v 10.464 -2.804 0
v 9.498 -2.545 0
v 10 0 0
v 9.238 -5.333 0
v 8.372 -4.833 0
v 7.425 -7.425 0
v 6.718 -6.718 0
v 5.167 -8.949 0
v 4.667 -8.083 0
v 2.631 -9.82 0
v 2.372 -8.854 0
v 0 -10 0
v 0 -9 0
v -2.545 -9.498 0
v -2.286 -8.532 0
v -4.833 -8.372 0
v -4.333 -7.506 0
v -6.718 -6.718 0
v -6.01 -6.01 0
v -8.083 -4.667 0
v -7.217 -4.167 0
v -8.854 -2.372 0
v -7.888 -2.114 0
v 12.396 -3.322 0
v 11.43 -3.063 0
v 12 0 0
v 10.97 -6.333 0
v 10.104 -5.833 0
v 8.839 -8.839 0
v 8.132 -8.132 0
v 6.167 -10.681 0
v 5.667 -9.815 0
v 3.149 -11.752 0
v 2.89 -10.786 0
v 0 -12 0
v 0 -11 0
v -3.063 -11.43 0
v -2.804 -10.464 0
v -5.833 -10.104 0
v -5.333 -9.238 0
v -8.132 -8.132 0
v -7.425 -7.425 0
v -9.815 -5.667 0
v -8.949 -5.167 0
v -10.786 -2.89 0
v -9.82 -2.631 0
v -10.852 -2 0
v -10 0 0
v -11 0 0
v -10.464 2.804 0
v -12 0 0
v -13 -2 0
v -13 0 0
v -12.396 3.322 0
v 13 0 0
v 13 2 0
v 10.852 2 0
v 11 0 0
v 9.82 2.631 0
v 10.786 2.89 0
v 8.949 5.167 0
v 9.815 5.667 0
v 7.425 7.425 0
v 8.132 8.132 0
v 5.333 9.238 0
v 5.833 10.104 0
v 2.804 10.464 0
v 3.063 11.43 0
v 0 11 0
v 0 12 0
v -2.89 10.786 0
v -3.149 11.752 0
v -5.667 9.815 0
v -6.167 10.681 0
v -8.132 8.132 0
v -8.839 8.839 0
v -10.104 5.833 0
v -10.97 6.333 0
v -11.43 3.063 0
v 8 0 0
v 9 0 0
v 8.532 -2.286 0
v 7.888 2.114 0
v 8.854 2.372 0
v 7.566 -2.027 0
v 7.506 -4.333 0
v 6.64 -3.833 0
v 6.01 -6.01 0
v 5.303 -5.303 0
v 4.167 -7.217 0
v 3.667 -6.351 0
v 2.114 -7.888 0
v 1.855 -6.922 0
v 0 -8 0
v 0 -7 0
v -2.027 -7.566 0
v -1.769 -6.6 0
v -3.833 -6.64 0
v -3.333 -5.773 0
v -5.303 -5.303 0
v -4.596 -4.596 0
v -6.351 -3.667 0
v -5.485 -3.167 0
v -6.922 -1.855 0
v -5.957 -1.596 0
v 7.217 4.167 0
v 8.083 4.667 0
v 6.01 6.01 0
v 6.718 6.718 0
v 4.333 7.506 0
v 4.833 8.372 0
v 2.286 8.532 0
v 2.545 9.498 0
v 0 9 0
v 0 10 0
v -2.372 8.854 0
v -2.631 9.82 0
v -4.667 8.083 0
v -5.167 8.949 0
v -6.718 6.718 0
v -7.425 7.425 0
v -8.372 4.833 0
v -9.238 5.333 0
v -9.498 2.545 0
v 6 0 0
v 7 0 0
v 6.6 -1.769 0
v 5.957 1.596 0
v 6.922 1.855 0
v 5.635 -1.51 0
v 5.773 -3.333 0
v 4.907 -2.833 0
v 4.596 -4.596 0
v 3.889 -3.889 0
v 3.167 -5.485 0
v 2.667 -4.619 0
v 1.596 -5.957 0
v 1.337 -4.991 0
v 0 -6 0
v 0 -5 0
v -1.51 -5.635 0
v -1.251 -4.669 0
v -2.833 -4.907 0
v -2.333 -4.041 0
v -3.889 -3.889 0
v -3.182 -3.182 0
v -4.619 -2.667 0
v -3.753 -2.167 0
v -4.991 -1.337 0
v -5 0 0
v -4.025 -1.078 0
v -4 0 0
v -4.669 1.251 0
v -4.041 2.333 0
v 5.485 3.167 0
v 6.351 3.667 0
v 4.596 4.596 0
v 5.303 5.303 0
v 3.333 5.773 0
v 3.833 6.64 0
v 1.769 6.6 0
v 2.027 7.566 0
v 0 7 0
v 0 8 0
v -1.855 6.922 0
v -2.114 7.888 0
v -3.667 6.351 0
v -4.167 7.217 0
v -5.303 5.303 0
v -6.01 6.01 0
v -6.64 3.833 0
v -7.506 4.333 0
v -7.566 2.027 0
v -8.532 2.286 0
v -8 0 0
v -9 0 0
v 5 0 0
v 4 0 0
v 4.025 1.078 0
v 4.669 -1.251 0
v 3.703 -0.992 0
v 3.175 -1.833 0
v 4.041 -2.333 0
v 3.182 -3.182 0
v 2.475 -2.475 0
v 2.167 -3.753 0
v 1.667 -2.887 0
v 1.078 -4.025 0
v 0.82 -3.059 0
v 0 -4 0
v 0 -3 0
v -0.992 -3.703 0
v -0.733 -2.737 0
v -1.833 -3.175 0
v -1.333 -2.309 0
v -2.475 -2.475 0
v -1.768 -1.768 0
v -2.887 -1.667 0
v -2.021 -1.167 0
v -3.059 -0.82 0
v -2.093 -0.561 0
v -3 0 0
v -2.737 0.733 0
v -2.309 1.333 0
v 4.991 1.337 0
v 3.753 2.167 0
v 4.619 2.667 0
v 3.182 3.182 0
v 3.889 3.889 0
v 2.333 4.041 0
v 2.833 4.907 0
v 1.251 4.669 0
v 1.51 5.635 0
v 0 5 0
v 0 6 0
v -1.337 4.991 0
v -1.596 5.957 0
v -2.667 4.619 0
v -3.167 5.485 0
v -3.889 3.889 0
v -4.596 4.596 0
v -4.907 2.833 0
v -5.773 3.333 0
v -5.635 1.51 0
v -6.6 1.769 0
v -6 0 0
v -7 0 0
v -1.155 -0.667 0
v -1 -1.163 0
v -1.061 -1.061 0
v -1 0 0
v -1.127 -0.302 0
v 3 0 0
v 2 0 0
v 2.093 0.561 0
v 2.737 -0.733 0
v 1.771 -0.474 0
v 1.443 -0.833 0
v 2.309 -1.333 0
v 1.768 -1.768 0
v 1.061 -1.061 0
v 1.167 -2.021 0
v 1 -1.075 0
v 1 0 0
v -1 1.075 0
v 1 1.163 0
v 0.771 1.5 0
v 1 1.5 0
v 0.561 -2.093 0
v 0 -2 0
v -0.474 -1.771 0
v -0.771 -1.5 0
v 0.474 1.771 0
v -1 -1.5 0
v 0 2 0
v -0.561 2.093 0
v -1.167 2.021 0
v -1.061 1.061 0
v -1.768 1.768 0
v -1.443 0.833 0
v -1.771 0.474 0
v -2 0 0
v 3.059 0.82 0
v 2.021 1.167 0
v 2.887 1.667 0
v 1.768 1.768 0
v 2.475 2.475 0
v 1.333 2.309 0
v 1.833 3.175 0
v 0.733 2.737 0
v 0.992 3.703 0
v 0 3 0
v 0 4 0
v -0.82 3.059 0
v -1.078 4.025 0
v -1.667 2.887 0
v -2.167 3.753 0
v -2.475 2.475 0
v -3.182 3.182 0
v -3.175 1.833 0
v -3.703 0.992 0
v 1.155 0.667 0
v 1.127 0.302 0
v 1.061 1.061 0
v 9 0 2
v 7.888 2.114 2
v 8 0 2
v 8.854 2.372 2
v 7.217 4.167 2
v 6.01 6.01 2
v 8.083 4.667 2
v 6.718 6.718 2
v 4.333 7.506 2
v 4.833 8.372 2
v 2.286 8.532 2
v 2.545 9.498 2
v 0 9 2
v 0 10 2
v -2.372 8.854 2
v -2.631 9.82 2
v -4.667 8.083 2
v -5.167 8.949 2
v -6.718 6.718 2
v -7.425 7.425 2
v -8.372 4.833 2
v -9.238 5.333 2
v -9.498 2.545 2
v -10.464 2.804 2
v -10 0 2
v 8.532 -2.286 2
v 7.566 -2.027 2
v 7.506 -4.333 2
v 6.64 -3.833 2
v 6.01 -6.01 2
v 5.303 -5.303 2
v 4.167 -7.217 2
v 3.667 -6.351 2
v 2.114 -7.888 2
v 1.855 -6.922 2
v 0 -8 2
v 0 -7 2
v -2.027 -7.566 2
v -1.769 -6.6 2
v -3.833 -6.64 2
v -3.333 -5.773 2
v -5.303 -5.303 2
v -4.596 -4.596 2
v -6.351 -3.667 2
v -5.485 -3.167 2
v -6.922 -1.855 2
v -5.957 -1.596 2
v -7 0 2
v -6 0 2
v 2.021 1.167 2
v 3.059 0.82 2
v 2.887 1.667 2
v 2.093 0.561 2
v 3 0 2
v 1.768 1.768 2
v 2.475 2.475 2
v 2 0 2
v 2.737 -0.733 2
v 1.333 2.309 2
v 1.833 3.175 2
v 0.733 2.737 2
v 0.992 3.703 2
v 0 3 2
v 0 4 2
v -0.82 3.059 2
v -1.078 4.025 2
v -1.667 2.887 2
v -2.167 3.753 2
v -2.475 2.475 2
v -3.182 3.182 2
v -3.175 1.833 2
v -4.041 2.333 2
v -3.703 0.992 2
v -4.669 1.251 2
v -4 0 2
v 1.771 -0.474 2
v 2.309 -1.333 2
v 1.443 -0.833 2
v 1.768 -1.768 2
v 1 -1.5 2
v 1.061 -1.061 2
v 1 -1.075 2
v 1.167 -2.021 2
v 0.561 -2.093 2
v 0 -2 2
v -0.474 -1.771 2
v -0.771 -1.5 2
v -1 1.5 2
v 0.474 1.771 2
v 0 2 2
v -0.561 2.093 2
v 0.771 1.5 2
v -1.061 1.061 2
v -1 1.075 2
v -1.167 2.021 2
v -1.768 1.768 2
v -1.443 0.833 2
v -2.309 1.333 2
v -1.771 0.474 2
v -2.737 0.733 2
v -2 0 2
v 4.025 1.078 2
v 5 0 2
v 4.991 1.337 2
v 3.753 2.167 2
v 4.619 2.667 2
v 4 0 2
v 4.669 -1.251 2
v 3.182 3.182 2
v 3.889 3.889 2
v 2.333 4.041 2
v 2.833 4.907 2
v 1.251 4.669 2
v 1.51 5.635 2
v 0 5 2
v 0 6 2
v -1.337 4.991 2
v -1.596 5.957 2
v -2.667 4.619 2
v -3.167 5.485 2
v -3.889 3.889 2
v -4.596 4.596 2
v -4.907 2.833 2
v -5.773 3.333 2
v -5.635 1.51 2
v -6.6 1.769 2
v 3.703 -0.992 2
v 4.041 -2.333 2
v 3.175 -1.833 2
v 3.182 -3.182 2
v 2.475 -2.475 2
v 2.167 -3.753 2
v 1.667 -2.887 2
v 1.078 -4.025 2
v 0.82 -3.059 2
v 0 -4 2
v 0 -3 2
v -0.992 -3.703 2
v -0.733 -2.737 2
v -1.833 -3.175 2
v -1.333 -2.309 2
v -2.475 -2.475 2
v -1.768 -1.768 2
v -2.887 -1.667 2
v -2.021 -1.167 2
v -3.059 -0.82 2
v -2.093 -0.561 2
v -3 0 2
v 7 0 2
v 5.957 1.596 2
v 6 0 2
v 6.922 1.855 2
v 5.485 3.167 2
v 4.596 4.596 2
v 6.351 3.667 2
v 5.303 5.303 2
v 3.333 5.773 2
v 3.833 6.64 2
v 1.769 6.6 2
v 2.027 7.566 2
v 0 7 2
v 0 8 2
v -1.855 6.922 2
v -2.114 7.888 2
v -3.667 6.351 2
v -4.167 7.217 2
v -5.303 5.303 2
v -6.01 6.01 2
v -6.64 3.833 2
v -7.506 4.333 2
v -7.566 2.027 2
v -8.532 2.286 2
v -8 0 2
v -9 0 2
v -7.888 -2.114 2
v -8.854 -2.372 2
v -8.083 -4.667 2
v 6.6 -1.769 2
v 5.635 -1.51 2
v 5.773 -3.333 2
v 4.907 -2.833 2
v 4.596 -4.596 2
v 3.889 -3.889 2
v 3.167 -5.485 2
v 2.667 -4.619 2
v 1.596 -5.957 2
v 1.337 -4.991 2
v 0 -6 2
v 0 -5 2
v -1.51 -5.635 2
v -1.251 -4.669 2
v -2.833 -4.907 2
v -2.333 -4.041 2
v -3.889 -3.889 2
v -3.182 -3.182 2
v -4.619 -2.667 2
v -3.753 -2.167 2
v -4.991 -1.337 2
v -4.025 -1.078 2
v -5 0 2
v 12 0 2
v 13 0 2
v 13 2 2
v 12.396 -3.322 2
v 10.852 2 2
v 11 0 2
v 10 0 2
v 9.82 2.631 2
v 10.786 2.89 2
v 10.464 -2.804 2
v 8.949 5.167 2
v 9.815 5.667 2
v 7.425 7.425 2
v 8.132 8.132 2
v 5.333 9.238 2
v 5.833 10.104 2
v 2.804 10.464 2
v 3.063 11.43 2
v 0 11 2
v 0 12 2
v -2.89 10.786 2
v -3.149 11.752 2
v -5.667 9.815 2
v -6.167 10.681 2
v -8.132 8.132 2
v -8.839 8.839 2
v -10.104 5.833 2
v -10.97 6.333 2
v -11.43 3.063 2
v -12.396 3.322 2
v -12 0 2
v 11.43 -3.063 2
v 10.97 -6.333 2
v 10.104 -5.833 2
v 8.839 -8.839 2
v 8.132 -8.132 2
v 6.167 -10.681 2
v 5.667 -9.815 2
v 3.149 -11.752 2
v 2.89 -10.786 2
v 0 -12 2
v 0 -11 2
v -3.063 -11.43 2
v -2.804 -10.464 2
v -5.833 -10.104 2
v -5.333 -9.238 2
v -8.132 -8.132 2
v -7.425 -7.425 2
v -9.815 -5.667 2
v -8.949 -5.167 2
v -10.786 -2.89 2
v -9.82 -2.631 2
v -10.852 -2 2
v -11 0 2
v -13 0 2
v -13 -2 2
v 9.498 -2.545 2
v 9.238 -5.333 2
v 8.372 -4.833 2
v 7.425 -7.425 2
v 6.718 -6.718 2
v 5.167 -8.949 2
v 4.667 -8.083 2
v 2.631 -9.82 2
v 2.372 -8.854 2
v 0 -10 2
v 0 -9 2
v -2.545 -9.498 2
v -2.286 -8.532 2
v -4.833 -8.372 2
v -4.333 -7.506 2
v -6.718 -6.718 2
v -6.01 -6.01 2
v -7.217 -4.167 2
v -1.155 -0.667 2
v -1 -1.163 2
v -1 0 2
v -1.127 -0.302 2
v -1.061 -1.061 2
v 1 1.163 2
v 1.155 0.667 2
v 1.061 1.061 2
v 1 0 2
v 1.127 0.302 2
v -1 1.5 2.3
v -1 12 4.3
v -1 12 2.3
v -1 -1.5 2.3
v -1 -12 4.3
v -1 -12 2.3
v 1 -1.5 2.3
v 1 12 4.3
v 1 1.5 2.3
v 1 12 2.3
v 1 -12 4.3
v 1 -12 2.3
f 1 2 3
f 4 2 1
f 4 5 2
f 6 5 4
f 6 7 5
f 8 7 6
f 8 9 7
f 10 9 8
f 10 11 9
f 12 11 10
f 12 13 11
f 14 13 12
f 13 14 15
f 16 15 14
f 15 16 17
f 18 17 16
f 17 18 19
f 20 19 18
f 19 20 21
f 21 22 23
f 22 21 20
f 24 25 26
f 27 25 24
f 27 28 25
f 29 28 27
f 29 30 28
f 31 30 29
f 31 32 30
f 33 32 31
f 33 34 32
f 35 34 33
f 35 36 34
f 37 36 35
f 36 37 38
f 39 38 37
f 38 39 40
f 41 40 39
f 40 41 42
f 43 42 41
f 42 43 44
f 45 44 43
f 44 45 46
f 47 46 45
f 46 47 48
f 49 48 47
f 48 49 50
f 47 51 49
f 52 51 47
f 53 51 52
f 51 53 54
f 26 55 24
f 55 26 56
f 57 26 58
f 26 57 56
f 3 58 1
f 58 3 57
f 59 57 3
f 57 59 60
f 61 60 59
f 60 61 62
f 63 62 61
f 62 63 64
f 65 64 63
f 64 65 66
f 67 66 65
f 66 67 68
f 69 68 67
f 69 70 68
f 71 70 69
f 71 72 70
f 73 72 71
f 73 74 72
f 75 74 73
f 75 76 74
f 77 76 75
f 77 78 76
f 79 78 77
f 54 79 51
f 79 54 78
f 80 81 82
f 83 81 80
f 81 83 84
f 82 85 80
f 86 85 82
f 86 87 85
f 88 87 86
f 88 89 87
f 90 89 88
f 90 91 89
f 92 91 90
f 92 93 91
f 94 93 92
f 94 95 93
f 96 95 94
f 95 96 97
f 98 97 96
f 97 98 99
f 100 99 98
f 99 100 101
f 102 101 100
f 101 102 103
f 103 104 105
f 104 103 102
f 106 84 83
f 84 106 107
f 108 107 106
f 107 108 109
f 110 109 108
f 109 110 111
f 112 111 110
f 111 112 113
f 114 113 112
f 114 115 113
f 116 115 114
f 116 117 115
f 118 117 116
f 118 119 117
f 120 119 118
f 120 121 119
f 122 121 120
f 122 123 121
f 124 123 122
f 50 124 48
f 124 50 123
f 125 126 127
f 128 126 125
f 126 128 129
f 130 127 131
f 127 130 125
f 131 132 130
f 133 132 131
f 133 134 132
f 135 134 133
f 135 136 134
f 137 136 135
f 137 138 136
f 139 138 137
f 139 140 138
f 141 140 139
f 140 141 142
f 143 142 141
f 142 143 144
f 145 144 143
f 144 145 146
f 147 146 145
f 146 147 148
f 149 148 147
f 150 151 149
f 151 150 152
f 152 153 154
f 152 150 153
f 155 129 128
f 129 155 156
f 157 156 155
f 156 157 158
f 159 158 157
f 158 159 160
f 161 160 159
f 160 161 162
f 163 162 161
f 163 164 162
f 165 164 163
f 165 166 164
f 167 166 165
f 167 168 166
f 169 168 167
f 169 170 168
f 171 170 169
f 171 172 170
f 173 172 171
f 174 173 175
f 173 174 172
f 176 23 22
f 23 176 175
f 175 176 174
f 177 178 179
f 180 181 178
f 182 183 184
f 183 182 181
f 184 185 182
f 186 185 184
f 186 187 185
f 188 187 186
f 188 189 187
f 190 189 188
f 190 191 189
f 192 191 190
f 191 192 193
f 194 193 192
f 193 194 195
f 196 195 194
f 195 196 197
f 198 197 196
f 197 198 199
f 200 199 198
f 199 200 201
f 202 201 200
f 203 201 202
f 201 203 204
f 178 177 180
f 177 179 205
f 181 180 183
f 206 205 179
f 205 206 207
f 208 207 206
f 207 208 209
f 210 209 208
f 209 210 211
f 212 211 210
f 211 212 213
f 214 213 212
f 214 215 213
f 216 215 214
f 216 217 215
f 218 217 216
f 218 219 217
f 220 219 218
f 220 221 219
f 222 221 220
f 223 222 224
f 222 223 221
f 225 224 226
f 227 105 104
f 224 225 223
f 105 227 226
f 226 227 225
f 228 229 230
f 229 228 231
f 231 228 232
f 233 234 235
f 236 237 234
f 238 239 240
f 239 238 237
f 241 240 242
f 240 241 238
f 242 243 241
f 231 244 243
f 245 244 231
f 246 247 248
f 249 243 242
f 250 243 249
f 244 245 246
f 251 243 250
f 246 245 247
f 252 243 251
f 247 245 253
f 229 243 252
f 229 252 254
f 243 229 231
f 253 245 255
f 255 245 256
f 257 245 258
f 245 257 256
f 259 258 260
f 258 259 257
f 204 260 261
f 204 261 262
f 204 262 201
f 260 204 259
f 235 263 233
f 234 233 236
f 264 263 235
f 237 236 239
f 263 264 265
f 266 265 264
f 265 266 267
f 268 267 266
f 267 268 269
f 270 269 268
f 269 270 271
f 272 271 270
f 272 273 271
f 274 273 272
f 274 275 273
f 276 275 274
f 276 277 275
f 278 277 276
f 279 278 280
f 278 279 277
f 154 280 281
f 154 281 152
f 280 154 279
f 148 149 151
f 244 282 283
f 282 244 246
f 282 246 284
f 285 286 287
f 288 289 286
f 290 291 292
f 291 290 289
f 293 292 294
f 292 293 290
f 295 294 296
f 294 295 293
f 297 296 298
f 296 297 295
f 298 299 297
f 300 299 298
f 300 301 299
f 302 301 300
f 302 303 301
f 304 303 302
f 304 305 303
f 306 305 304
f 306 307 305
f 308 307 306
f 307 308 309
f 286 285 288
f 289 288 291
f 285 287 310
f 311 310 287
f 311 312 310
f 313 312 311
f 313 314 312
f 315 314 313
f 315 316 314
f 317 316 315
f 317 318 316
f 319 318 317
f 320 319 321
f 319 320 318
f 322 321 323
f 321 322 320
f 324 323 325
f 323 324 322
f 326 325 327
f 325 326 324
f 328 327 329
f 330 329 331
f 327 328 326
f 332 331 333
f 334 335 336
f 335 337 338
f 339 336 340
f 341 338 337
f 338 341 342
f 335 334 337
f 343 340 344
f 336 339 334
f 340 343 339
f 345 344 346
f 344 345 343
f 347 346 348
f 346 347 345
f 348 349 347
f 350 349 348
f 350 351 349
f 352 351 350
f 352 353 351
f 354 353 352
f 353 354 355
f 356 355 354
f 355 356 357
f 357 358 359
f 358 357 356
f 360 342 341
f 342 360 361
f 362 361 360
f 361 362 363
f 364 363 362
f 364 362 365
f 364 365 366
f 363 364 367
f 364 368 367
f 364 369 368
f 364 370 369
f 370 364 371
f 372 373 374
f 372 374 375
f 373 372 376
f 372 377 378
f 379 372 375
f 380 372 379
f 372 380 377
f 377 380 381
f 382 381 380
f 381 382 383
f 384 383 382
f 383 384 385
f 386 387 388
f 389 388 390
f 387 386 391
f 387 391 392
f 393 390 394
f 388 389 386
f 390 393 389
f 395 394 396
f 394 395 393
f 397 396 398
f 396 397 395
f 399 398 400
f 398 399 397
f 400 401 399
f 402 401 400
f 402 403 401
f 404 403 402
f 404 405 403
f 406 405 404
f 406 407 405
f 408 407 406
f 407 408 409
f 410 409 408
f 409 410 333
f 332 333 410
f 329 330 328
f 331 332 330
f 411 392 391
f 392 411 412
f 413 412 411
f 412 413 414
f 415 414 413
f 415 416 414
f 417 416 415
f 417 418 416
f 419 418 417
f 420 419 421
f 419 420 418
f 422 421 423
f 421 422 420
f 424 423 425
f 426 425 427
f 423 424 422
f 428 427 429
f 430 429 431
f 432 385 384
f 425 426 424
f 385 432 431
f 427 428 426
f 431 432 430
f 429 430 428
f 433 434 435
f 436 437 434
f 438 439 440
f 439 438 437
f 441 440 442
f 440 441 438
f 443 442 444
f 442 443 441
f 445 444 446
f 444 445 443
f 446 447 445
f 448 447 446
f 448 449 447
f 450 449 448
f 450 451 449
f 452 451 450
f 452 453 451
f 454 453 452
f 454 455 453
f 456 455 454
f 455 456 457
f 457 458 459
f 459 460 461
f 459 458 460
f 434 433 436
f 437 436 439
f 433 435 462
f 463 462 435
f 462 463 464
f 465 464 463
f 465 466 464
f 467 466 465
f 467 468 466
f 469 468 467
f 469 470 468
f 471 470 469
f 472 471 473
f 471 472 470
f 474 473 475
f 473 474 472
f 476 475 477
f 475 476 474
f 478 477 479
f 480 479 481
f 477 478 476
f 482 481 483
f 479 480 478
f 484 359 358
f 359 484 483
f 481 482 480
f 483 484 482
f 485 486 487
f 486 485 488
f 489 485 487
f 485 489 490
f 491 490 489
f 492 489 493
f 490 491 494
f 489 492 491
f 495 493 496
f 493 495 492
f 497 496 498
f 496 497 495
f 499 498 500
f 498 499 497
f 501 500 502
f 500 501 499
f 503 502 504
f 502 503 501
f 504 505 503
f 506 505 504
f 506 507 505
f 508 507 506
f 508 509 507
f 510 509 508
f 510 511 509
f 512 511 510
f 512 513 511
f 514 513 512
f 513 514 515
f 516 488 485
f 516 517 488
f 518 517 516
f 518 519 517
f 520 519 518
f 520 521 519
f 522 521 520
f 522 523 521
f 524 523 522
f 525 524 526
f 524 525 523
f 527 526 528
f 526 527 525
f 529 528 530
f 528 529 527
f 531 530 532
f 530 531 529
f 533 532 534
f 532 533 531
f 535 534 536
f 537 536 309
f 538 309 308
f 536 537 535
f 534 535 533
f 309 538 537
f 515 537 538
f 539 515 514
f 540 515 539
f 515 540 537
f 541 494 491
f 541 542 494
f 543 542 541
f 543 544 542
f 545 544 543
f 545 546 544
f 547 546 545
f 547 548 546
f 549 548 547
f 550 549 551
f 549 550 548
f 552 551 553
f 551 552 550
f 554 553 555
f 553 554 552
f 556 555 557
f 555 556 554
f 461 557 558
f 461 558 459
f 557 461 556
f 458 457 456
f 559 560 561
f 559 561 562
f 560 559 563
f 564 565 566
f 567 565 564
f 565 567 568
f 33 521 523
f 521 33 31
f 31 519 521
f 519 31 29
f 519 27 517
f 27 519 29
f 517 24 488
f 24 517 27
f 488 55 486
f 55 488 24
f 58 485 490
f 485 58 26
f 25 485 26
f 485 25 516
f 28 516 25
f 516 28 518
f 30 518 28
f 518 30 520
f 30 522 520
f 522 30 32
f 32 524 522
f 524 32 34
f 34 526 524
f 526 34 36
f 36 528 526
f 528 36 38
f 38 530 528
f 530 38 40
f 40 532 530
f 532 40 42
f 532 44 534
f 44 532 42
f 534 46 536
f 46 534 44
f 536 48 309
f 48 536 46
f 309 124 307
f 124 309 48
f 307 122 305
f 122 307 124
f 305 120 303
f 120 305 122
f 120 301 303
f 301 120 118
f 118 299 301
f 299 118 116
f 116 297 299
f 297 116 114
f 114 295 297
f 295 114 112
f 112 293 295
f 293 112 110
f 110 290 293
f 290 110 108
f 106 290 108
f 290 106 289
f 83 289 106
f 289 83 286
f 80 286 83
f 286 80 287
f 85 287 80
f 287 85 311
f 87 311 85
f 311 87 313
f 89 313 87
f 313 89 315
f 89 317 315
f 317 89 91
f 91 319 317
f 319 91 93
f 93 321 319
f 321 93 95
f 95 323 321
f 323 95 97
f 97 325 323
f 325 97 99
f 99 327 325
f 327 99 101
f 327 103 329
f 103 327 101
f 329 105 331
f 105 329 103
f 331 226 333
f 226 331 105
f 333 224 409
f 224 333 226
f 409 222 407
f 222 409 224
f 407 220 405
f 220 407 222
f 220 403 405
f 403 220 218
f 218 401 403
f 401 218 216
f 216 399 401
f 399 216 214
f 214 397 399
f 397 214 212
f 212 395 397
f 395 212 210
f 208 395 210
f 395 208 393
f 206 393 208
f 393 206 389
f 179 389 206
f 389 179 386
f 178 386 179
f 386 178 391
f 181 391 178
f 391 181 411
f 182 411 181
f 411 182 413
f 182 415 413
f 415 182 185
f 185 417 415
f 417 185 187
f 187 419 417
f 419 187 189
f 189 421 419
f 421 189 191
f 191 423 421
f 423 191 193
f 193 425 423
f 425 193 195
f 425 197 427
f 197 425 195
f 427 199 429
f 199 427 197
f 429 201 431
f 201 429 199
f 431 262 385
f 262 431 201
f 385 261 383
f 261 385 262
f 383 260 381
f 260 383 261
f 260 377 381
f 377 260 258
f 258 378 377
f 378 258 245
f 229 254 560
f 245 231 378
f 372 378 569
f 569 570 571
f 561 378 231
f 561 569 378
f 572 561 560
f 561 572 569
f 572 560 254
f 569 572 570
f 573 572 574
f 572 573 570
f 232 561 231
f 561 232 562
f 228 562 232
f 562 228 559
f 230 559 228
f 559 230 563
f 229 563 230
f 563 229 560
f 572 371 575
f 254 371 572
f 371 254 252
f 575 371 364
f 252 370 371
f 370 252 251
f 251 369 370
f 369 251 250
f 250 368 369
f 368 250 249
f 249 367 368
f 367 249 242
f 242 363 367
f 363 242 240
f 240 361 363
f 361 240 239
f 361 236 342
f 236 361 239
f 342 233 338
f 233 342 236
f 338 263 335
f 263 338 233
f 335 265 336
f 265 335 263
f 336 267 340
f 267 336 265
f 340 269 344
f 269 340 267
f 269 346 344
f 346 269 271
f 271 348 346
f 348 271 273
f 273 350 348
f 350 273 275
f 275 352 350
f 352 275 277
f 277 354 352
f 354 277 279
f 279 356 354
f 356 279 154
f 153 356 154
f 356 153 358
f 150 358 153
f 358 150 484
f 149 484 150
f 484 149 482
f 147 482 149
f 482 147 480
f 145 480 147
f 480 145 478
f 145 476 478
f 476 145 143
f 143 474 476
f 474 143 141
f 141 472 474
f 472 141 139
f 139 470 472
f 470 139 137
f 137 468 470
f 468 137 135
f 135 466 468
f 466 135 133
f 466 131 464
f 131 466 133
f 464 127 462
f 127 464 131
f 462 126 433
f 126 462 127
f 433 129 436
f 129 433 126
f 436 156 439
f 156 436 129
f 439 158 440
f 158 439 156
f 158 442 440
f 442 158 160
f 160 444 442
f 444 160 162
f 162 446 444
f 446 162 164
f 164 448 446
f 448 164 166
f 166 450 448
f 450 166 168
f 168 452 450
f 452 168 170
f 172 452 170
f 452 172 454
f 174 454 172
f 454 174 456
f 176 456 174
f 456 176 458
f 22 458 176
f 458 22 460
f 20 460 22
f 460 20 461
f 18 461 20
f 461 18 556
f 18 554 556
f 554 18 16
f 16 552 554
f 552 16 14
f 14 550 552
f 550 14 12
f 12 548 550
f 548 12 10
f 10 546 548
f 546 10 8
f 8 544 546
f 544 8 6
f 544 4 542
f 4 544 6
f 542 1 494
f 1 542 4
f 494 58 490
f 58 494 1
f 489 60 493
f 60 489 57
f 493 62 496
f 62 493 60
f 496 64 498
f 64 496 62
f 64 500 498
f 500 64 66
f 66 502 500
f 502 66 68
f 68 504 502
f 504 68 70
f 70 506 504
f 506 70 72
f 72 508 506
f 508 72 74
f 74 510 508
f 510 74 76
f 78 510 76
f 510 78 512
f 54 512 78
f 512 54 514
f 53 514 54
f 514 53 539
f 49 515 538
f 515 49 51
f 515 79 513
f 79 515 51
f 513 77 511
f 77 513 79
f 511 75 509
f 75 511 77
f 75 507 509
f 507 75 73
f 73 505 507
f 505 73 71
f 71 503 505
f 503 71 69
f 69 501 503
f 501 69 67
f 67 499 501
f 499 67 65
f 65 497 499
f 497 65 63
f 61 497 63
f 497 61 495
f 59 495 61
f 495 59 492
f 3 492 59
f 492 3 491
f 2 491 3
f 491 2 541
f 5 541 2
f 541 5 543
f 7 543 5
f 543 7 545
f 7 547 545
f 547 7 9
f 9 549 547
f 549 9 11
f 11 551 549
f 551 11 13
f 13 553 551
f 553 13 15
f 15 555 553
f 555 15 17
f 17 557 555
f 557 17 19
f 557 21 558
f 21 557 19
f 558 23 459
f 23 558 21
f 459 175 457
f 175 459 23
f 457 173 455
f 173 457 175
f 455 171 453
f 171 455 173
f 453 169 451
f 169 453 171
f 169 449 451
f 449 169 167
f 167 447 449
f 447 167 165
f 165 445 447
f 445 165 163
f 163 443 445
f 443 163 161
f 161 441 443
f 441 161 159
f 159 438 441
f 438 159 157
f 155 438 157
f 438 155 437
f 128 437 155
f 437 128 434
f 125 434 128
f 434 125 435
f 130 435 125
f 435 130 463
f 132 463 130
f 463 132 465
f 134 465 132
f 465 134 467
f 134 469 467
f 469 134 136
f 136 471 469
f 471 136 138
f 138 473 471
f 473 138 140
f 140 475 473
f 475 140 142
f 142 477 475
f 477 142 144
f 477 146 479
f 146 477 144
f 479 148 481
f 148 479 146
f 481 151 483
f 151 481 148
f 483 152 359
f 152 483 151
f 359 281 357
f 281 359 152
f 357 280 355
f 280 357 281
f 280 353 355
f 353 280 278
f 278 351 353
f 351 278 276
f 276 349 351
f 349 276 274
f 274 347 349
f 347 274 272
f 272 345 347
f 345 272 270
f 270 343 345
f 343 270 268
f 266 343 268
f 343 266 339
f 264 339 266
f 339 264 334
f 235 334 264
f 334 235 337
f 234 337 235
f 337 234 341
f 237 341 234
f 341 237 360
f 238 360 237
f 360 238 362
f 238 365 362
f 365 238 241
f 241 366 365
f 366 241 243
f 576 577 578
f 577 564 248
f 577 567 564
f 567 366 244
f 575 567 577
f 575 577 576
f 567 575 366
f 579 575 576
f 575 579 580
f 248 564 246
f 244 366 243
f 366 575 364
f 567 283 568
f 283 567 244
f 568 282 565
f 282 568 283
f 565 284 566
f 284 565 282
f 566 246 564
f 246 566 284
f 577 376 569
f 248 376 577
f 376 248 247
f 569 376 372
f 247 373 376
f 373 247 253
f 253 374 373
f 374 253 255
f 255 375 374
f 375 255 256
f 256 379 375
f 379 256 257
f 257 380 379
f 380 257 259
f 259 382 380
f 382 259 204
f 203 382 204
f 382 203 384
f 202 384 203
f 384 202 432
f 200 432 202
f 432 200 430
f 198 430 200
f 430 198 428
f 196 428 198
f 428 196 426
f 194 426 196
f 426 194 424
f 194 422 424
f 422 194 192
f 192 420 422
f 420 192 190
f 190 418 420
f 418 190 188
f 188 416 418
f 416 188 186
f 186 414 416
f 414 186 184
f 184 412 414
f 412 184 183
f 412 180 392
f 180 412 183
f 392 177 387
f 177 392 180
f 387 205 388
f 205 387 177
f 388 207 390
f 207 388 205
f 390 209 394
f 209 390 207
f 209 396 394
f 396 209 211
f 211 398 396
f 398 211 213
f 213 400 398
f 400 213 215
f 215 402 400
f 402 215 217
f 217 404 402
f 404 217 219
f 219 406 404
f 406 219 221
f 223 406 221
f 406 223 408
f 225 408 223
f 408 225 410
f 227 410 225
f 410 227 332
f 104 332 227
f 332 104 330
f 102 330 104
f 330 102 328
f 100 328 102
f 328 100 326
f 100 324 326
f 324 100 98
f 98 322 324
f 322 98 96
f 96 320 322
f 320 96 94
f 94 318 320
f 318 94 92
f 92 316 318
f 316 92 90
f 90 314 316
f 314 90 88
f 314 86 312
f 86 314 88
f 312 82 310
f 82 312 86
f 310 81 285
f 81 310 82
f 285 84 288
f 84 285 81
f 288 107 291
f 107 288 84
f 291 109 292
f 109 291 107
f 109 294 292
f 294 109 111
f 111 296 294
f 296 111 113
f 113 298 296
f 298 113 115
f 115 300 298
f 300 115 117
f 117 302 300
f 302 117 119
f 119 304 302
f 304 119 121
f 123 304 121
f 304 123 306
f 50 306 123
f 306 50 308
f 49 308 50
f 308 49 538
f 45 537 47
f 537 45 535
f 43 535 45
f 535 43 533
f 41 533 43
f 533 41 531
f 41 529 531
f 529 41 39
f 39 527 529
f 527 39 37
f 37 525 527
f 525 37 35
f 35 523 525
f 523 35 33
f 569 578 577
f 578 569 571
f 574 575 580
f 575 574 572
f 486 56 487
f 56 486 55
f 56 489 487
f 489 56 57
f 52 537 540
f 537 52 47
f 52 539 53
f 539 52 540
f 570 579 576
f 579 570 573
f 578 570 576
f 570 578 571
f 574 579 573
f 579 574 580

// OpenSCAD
// file: spiral.scad
module spiral(width = 1, laps = 1, grad = 3/360, r0 = 1, fn = 24) {
    step = 360 / fn;

    points = concat(
        [for(a = [0 : step : 360 * laps])
            [(r0 + a * grad) * cos(a), (r0 + a * grad) * sin(a)]
        ],
        [for(a = [360 * laps : -step : 0])
            [(r0 + a * grad + width) * cos(a), (r0 + a * grad + width) * sin(a)]
        ]
    );

    polygon(points);

}

spiral(r0 = 0, laps = 10, grad=3/360);
// main file
use <spiral.scad>

h = 2;
t = 1;
laps = 3;
grad = 4;
lock_h = 0.3;
handle_h = 2;

union(){
linear_extrude(height=h){
    spiral(width=t, r0=0, laps=laps, grad=grad/360);
    rotate(180){
        spiral(width=t, r0=0, laps=laps, grad=grad/360);
    }
    square([2, 3], center=true);
}

translate([0, 0, h + lock_h/2]){
    cube([2, 3, lock_h], center=true);
}
}
  
translate([grad*(laps) - grad/2, 0, 0])
    cube([(grad/2 + t), 2, 2]);

rotate(180){
translate([grad*(laps) - grad/2, 0, 0])
    cube([(grad/2 + t), 2, 2]);
}

translate([0, 0, h + handle_h/2 + lock_h]){
    cube([2, grad*laps*2, handle_h], center=true);
}
